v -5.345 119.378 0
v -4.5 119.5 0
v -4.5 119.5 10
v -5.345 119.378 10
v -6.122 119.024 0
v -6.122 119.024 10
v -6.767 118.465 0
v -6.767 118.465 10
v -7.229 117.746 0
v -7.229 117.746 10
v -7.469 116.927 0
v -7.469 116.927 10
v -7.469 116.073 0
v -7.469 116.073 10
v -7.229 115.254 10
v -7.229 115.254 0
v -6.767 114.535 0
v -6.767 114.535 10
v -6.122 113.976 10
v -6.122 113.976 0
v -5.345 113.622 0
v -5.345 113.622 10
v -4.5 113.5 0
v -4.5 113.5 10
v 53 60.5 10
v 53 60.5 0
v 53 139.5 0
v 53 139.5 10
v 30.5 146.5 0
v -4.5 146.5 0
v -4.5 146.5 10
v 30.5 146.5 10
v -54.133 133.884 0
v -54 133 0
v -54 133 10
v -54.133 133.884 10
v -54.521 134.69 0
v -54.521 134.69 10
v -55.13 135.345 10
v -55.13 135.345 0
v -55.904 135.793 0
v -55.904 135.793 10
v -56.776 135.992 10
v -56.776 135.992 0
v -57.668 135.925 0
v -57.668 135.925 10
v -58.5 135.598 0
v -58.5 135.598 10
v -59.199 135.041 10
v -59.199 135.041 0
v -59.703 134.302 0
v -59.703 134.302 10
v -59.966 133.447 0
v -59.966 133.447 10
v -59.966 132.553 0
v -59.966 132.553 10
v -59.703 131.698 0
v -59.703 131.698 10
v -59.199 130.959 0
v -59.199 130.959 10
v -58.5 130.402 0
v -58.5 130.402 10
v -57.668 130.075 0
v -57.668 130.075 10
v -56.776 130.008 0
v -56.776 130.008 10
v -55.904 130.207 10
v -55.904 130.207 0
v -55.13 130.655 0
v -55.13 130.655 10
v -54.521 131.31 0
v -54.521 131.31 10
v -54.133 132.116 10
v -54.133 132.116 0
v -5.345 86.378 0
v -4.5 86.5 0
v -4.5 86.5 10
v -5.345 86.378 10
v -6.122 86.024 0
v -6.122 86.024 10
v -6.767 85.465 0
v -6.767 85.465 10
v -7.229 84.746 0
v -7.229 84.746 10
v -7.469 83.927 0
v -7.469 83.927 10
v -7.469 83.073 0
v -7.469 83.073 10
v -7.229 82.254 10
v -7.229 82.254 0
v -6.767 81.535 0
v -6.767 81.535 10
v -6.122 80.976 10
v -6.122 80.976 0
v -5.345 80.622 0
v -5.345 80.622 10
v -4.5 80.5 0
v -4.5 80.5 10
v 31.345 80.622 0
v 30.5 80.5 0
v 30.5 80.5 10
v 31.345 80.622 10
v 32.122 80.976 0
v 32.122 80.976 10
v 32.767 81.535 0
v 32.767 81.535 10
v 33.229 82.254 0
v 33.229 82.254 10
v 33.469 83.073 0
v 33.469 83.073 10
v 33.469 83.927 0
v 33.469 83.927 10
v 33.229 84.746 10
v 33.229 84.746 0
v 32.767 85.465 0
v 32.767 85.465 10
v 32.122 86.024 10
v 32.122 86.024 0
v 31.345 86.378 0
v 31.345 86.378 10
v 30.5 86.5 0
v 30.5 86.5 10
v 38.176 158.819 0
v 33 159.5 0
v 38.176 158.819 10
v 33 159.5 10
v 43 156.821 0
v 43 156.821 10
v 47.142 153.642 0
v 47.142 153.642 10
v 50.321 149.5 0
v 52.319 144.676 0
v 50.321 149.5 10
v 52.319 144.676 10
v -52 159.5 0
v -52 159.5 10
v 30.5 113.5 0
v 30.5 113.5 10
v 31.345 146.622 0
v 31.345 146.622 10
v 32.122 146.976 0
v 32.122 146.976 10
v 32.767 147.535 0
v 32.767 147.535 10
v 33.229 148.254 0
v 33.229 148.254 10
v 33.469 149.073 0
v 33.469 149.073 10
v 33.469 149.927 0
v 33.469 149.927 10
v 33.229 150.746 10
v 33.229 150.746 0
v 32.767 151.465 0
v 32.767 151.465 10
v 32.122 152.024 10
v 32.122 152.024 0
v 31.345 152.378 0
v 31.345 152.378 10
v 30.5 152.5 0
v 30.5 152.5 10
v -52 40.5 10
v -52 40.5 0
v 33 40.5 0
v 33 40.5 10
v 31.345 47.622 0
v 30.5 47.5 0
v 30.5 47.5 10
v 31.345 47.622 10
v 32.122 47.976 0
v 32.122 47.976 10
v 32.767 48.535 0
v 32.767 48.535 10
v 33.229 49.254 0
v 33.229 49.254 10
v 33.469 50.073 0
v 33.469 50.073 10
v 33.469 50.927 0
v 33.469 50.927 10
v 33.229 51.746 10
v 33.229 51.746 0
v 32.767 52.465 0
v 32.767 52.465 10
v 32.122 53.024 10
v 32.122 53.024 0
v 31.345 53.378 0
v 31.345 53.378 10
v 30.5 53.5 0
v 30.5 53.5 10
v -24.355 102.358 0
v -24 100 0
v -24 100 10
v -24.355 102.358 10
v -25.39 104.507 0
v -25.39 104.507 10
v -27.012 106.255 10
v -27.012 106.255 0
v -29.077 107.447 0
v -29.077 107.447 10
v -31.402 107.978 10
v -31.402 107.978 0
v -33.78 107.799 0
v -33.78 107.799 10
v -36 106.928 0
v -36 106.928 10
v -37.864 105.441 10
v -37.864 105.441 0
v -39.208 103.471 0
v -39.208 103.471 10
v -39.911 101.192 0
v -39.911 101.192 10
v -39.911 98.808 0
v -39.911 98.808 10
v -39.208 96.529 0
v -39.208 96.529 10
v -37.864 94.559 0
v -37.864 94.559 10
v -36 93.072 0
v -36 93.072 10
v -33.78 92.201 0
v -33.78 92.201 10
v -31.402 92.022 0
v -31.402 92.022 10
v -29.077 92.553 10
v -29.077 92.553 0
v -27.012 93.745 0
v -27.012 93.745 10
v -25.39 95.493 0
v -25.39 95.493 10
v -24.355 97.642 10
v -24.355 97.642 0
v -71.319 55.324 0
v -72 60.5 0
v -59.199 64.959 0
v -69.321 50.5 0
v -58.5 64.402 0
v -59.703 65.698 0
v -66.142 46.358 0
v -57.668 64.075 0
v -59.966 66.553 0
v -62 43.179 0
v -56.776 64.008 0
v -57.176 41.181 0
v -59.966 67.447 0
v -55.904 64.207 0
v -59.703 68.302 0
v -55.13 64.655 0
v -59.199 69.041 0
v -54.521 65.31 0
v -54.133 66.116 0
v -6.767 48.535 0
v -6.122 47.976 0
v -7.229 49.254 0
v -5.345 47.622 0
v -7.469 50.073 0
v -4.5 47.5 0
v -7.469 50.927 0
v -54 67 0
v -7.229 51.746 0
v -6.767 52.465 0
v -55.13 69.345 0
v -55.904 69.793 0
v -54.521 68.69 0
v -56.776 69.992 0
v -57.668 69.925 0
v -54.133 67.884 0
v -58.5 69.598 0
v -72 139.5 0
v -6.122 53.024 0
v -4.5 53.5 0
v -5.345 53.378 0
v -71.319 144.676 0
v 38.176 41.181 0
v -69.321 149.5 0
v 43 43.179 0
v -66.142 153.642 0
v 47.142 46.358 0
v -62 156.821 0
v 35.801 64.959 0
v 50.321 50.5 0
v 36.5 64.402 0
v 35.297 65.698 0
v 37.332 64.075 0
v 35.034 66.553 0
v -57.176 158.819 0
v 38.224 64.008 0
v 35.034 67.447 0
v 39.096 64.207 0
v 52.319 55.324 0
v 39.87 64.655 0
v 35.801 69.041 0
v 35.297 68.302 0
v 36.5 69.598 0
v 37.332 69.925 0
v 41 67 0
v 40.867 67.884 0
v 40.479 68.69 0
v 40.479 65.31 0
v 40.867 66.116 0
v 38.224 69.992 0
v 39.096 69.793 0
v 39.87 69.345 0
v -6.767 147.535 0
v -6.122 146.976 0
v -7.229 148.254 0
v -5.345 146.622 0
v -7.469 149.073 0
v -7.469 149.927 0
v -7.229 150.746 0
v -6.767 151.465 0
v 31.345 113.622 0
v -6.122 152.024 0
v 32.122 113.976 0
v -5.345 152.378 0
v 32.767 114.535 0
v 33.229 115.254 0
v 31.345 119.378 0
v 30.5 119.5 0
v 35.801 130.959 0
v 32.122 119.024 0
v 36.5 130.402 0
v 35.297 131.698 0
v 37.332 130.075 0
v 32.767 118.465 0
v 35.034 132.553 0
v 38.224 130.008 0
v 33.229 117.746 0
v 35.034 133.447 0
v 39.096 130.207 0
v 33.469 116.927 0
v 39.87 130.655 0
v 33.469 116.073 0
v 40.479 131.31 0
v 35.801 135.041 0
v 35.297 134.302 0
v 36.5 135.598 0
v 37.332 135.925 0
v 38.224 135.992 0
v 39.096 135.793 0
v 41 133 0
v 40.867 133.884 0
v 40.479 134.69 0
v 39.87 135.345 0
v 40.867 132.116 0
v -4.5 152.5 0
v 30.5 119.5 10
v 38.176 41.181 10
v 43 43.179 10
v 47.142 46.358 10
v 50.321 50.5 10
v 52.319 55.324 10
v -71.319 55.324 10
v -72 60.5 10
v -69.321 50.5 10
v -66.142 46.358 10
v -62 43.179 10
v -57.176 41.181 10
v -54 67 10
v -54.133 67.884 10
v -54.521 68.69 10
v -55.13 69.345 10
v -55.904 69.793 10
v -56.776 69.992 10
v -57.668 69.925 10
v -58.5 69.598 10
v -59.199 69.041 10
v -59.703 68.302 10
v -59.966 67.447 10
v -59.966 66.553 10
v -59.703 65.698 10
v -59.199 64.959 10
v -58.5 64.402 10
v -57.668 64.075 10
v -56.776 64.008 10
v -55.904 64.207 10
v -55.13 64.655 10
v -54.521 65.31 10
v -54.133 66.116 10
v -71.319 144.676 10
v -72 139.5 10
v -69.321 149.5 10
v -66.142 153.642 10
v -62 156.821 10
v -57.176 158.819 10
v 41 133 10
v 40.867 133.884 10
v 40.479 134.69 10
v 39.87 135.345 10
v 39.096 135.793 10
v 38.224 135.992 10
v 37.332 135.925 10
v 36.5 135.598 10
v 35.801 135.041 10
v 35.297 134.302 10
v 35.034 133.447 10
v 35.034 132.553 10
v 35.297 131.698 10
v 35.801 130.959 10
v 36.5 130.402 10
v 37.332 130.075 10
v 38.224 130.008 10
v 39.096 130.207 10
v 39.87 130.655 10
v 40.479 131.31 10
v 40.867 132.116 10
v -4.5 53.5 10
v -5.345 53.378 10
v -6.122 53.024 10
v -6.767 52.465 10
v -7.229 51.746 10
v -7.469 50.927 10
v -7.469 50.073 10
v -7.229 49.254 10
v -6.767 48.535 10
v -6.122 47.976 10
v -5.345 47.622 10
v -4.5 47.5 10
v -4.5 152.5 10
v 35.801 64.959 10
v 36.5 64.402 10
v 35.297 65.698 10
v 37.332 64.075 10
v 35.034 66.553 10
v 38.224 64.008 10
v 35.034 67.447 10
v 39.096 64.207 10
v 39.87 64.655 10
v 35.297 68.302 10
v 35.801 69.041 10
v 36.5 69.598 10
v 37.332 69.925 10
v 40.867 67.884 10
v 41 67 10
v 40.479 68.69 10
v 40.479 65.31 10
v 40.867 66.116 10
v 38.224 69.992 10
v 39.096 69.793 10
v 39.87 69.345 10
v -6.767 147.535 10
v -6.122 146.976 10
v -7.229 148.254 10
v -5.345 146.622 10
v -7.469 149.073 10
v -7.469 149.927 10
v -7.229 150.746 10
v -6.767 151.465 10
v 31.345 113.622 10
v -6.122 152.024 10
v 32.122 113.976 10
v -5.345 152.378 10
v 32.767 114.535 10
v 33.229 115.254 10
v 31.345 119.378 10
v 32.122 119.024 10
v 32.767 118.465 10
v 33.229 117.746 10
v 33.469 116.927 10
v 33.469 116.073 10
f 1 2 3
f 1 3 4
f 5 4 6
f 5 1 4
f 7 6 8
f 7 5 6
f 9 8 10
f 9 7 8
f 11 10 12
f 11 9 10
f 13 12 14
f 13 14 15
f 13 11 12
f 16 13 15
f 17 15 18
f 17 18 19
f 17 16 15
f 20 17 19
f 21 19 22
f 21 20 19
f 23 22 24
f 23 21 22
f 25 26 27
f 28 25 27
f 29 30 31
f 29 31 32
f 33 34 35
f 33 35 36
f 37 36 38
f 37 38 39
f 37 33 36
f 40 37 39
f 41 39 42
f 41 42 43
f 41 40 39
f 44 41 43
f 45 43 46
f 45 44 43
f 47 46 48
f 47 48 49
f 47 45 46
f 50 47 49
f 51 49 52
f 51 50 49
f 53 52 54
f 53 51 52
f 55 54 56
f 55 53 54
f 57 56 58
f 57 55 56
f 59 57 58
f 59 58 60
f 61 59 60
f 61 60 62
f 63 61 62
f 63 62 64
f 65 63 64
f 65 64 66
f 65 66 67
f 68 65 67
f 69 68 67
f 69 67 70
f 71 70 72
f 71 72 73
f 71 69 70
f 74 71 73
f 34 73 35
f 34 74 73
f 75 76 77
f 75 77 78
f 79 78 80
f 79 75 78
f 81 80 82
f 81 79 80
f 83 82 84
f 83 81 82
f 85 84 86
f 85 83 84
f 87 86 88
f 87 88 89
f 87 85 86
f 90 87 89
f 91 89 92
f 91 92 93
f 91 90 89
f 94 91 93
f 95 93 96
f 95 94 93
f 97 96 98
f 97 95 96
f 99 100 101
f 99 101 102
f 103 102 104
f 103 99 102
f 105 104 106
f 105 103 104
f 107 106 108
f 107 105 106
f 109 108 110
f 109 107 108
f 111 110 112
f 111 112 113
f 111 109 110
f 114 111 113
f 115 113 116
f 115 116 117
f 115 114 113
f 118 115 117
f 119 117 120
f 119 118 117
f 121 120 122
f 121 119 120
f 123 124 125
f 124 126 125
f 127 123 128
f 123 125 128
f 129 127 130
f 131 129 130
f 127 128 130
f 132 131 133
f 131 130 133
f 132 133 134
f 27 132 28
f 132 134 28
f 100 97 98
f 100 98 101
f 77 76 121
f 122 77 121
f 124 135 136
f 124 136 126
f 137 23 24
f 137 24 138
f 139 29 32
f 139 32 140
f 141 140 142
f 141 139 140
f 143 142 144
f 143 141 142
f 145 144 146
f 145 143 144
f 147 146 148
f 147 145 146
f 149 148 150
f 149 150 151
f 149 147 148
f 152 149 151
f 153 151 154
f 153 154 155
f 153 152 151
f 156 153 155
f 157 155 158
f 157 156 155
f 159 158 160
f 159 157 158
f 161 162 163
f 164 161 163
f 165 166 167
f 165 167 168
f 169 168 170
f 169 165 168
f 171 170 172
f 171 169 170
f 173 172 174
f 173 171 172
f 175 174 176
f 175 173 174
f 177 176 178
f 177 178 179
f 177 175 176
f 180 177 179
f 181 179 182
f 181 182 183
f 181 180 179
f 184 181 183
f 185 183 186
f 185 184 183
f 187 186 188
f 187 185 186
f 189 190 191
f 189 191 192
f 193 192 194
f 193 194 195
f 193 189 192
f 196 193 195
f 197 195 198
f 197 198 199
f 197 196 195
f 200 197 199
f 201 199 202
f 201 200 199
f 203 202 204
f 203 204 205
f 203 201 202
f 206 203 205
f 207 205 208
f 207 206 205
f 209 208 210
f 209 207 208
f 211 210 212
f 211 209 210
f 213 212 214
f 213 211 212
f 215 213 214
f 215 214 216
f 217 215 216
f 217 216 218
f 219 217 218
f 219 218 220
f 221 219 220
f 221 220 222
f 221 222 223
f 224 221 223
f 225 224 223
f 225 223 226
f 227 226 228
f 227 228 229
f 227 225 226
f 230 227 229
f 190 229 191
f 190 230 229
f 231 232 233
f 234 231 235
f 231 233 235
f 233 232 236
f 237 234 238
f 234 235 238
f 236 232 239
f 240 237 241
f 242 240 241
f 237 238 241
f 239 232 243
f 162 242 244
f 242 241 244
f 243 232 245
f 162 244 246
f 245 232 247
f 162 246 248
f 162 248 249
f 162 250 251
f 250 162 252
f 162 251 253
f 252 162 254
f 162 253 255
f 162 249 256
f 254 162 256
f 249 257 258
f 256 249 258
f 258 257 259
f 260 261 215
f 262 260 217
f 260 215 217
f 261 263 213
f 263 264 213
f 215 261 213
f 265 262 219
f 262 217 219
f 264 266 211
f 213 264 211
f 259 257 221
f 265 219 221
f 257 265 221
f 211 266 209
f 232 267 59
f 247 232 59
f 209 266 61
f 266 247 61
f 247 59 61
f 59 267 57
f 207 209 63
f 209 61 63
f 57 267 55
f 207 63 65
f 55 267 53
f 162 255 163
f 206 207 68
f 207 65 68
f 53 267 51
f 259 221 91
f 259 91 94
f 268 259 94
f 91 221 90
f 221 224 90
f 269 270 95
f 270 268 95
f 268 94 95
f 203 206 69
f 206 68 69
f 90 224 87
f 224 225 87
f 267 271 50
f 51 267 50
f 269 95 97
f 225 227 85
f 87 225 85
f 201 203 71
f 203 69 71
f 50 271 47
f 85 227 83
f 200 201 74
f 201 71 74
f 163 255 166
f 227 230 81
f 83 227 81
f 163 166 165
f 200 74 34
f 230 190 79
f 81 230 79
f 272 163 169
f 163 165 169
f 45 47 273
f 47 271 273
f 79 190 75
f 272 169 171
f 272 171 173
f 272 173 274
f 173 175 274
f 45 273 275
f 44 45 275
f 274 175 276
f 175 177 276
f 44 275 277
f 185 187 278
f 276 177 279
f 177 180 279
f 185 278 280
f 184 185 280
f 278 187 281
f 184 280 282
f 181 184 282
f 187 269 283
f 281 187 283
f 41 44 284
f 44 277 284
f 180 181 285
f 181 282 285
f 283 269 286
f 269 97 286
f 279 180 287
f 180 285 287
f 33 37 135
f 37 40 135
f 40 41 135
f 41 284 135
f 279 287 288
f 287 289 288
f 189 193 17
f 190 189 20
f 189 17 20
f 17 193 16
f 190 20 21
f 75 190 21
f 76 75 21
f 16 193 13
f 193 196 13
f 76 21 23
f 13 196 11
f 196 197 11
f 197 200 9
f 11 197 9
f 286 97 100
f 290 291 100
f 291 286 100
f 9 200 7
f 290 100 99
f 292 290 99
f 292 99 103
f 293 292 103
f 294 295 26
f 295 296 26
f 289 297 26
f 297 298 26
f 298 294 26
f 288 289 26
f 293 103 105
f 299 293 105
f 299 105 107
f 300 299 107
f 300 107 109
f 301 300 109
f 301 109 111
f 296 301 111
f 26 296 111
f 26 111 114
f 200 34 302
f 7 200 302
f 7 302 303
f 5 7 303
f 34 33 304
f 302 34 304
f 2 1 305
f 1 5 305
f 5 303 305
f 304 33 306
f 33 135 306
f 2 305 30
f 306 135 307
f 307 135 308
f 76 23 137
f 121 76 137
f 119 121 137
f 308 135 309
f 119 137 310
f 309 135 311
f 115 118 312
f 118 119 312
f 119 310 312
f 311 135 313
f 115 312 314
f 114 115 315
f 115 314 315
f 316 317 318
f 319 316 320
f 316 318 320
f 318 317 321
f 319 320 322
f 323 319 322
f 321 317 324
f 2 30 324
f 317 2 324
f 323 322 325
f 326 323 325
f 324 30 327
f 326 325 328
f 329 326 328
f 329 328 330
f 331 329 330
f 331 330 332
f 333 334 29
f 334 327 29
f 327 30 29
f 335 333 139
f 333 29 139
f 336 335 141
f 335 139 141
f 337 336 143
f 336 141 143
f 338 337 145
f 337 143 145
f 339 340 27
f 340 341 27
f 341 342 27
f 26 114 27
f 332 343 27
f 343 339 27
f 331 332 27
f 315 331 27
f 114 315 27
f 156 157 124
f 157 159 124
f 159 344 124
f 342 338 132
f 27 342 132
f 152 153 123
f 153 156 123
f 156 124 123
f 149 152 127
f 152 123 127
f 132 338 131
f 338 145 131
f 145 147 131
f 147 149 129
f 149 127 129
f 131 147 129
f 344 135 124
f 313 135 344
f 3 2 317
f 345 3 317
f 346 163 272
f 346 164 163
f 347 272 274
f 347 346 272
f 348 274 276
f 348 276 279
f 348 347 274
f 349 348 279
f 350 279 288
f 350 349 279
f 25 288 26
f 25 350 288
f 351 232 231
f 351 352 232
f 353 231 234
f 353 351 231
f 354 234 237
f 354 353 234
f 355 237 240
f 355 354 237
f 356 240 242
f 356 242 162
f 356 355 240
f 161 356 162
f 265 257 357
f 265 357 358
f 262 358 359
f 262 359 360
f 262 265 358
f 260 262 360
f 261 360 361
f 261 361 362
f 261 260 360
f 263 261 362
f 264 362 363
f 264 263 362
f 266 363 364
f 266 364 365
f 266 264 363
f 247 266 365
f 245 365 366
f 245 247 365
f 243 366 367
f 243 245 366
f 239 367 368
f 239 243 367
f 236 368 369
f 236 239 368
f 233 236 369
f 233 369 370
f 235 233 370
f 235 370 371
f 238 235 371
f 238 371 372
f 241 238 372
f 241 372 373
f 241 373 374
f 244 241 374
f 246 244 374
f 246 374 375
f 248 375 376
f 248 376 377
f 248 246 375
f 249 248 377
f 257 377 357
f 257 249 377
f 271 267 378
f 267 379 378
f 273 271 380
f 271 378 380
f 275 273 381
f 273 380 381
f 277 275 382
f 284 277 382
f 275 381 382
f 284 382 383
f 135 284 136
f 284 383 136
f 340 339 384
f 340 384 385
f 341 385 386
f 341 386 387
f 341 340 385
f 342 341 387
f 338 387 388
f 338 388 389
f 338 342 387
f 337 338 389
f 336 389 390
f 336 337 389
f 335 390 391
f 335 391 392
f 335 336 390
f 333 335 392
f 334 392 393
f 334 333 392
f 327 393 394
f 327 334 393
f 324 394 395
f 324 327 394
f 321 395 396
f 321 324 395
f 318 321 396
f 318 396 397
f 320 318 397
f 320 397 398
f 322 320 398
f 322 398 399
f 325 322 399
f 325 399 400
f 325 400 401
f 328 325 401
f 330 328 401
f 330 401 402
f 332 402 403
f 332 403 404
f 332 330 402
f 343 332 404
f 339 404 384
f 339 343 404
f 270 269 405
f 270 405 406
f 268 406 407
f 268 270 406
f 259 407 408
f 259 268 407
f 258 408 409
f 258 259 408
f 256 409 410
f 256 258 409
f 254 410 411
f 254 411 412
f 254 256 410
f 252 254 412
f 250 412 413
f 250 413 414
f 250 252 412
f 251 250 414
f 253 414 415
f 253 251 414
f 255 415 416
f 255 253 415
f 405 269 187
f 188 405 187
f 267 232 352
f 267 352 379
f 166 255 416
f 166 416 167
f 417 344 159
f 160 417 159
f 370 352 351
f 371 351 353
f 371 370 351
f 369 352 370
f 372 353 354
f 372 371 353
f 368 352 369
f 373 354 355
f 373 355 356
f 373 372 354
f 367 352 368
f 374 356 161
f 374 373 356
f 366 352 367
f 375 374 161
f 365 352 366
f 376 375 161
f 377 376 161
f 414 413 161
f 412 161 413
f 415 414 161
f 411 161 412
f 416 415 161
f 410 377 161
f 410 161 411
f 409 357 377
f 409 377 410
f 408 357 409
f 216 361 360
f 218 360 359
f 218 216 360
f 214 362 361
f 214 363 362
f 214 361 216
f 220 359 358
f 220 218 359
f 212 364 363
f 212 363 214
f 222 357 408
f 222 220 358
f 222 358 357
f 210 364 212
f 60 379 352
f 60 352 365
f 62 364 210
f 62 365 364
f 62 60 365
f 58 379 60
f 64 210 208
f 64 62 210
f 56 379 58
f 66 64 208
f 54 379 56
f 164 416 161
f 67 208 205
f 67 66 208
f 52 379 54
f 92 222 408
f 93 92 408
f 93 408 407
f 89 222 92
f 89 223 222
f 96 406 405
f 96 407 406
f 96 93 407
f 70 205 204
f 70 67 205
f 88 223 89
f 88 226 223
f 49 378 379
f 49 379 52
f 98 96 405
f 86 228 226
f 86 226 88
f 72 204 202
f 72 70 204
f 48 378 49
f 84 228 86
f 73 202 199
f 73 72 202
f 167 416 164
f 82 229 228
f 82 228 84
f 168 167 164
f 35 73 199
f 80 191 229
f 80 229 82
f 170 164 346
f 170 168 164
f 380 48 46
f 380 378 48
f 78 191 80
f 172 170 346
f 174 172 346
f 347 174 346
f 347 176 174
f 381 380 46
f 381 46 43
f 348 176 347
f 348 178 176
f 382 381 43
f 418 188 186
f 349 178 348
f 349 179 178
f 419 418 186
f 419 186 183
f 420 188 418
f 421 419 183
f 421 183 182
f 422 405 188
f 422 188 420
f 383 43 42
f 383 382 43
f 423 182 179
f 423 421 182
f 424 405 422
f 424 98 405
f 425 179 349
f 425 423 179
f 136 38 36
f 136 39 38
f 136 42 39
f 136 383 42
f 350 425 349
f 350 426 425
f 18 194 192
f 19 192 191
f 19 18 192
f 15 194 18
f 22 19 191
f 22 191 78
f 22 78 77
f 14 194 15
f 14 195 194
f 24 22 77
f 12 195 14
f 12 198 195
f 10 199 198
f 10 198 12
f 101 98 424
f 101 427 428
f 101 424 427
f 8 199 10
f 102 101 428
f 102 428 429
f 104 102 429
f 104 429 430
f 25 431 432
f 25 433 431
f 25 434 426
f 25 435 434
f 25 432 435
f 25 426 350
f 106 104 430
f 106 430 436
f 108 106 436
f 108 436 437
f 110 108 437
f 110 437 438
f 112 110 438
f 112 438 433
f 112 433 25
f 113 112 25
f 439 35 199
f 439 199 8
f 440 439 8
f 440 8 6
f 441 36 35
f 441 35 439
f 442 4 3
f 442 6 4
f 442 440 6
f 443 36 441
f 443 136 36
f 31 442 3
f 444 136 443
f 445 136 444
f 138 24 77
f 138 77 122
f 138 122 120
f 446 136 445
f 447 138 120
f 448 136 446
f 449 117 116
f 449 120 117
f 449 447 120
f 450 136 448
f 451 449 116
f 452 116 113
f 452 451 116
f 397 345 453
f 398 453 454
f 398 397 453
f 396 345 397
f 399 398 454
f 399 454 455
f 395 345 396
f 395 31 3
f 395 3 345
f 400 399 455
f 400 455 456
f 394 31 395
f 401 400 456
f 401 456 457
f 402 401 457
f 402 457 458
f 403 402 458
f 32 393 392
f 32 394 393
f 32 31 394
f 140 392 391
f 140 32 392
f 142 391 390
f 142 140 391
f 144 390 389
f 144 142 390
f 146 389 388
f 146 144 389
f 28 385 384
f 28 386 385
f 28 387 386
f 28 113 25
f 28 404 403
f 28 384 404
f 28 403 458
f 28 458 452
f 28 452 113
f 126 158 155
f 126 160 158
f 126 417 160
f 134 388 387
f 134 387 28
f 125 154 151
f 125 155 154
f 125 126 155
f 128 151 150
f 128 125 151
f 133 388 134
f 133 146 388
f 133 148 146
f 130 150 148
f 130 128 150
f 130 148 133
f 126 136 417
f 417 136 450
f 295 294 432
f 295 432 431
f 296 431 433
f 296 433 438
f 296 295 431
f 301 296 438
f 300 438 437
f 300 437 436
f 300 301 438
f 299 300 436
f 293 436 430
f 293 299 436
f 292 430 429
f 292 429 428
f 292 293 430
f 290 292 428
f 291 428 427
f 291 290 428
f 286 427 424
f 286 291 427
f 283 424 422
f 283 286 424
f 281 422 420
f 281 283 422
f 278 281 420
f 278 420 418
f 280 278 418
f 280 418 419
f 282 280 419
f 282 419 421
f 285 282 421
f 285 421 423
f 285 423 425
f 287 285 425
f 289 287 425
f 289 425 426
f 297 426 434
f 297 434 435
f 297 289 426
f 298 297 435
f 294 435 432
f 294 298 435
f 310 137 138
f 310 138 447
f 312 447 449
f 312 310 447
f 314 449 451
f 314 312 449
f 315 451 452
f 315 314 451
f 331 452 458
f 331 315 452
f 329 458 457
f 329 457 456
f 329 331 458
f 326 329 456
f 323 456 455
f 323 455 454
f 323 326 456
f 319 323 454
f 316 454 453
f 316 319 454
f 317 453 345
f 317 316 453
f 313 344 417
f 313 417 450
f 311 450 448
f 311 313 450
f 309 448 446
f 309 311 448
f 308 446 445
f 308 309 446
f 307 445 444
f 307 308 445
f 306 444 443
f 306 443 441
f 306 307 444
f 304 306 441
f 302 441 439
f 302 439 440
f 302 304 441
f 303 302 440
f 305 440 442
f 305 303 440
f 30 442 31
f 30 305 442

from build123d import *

# Parameters (mm, degrees)
SKETCH_W   = 125
SKETCH_H   = 119
SKETCH_R   = 8
SKETCH_R_2 = 3
PAD_DEPTH  = 10
FILLET_R   = 20


with BuildPart() as part:
    # Sketch → Pad (new body)
    with BuildSketch(Plane.XY):
        with Locations((-9.5, 100)):
            Rectangle(SKETCH_W, SKETCH_H)
        with Locations((-32, 100)):
            Circle(SKETCH_R, mode=Mode.SUBTRACT)
        with Locations((-57, 133)):
            Circle(SKETCH_R_2, mode=Mode.SUBTRACT)
        with Locations((-57, 67)):
            Circle(SKETCH_R_2, mode=Mode.SUBTRACT)
        with Locations((38, 133)):
            Circle(SKETCH_R_2, mode=Mode.SUBTRACT)
        with Locations((38, 67)):
            Circle(SKETCH_R_2, mode=Mode.SUBTRACT)
        with BuildLine():
            ThreePointArc((-4.5, 152.5), (-7.5, 149.5), (-4.5, 146.5))
            Line((-4.5, 146.5), (30.5, 146.5))
            ThreePointArc((30.5, 146.5), (33.5, 149.5), (30.5, 152.5))
            Line((-4.5, 152.5), (30.5, 152.5))
        make_face(mode=Mode.SUBTRACT)
        with BuildLine():
            ThreePointArc((-4.5, 119.5), (-7.5, 116.5), (-4.5, 113.5))
            Line((-4.5, 113.5), (30.5, 113.5))
            ThreePointArc((30.5, 113.5), (33.5, 116.5), (30.5, 119.5))
            Line((-4.5, 119.5), (30.5, 119.5))
        make_face(mode=Mode.SUBTRACT)
        with BuildLine():
            ThreePointArc((-4.5, 86.5), (-7.5, 83.5), (-4.5, 80.5))
            Line((-4.5, 80.5), (30.5, 80.5))
            ThreePointArc((30.5, 80.5), (33.5, 83.5), (30.5, 86.5))
            Line((-4.5, 86.5), (30.5, 86.5))
        make_face(mode=Mode.SUBTRACT)
        with BuildLine():
            ThreePointArc((-4.5, 53.5), (-7.5, 50.5), (-4.5, 47.5))
            Line((-4.5, 47.5), (30.5, 47.5))
            ThreePointArc((30.5, 47.5), (33.5, 50.5), (30.5, 53.5))
            Line((-4.5, 53.5), (30.5, 53.5))
        make_face(mode=Mode.SUBTRACT)
    extrude(amount=PAD_DEPTH)

    # Fillet
    fillet_edges = [part.edges().sort_by_distance(p)[0] for p in [
        (53, 40.5, 5),
        (53, 159.5, 5),
        (-72, 40.5, 5),
        (-72, 159.5, 5),
    ]]
    fillet(fillet_edges, radius=FILLET_R)


solid = part.part
